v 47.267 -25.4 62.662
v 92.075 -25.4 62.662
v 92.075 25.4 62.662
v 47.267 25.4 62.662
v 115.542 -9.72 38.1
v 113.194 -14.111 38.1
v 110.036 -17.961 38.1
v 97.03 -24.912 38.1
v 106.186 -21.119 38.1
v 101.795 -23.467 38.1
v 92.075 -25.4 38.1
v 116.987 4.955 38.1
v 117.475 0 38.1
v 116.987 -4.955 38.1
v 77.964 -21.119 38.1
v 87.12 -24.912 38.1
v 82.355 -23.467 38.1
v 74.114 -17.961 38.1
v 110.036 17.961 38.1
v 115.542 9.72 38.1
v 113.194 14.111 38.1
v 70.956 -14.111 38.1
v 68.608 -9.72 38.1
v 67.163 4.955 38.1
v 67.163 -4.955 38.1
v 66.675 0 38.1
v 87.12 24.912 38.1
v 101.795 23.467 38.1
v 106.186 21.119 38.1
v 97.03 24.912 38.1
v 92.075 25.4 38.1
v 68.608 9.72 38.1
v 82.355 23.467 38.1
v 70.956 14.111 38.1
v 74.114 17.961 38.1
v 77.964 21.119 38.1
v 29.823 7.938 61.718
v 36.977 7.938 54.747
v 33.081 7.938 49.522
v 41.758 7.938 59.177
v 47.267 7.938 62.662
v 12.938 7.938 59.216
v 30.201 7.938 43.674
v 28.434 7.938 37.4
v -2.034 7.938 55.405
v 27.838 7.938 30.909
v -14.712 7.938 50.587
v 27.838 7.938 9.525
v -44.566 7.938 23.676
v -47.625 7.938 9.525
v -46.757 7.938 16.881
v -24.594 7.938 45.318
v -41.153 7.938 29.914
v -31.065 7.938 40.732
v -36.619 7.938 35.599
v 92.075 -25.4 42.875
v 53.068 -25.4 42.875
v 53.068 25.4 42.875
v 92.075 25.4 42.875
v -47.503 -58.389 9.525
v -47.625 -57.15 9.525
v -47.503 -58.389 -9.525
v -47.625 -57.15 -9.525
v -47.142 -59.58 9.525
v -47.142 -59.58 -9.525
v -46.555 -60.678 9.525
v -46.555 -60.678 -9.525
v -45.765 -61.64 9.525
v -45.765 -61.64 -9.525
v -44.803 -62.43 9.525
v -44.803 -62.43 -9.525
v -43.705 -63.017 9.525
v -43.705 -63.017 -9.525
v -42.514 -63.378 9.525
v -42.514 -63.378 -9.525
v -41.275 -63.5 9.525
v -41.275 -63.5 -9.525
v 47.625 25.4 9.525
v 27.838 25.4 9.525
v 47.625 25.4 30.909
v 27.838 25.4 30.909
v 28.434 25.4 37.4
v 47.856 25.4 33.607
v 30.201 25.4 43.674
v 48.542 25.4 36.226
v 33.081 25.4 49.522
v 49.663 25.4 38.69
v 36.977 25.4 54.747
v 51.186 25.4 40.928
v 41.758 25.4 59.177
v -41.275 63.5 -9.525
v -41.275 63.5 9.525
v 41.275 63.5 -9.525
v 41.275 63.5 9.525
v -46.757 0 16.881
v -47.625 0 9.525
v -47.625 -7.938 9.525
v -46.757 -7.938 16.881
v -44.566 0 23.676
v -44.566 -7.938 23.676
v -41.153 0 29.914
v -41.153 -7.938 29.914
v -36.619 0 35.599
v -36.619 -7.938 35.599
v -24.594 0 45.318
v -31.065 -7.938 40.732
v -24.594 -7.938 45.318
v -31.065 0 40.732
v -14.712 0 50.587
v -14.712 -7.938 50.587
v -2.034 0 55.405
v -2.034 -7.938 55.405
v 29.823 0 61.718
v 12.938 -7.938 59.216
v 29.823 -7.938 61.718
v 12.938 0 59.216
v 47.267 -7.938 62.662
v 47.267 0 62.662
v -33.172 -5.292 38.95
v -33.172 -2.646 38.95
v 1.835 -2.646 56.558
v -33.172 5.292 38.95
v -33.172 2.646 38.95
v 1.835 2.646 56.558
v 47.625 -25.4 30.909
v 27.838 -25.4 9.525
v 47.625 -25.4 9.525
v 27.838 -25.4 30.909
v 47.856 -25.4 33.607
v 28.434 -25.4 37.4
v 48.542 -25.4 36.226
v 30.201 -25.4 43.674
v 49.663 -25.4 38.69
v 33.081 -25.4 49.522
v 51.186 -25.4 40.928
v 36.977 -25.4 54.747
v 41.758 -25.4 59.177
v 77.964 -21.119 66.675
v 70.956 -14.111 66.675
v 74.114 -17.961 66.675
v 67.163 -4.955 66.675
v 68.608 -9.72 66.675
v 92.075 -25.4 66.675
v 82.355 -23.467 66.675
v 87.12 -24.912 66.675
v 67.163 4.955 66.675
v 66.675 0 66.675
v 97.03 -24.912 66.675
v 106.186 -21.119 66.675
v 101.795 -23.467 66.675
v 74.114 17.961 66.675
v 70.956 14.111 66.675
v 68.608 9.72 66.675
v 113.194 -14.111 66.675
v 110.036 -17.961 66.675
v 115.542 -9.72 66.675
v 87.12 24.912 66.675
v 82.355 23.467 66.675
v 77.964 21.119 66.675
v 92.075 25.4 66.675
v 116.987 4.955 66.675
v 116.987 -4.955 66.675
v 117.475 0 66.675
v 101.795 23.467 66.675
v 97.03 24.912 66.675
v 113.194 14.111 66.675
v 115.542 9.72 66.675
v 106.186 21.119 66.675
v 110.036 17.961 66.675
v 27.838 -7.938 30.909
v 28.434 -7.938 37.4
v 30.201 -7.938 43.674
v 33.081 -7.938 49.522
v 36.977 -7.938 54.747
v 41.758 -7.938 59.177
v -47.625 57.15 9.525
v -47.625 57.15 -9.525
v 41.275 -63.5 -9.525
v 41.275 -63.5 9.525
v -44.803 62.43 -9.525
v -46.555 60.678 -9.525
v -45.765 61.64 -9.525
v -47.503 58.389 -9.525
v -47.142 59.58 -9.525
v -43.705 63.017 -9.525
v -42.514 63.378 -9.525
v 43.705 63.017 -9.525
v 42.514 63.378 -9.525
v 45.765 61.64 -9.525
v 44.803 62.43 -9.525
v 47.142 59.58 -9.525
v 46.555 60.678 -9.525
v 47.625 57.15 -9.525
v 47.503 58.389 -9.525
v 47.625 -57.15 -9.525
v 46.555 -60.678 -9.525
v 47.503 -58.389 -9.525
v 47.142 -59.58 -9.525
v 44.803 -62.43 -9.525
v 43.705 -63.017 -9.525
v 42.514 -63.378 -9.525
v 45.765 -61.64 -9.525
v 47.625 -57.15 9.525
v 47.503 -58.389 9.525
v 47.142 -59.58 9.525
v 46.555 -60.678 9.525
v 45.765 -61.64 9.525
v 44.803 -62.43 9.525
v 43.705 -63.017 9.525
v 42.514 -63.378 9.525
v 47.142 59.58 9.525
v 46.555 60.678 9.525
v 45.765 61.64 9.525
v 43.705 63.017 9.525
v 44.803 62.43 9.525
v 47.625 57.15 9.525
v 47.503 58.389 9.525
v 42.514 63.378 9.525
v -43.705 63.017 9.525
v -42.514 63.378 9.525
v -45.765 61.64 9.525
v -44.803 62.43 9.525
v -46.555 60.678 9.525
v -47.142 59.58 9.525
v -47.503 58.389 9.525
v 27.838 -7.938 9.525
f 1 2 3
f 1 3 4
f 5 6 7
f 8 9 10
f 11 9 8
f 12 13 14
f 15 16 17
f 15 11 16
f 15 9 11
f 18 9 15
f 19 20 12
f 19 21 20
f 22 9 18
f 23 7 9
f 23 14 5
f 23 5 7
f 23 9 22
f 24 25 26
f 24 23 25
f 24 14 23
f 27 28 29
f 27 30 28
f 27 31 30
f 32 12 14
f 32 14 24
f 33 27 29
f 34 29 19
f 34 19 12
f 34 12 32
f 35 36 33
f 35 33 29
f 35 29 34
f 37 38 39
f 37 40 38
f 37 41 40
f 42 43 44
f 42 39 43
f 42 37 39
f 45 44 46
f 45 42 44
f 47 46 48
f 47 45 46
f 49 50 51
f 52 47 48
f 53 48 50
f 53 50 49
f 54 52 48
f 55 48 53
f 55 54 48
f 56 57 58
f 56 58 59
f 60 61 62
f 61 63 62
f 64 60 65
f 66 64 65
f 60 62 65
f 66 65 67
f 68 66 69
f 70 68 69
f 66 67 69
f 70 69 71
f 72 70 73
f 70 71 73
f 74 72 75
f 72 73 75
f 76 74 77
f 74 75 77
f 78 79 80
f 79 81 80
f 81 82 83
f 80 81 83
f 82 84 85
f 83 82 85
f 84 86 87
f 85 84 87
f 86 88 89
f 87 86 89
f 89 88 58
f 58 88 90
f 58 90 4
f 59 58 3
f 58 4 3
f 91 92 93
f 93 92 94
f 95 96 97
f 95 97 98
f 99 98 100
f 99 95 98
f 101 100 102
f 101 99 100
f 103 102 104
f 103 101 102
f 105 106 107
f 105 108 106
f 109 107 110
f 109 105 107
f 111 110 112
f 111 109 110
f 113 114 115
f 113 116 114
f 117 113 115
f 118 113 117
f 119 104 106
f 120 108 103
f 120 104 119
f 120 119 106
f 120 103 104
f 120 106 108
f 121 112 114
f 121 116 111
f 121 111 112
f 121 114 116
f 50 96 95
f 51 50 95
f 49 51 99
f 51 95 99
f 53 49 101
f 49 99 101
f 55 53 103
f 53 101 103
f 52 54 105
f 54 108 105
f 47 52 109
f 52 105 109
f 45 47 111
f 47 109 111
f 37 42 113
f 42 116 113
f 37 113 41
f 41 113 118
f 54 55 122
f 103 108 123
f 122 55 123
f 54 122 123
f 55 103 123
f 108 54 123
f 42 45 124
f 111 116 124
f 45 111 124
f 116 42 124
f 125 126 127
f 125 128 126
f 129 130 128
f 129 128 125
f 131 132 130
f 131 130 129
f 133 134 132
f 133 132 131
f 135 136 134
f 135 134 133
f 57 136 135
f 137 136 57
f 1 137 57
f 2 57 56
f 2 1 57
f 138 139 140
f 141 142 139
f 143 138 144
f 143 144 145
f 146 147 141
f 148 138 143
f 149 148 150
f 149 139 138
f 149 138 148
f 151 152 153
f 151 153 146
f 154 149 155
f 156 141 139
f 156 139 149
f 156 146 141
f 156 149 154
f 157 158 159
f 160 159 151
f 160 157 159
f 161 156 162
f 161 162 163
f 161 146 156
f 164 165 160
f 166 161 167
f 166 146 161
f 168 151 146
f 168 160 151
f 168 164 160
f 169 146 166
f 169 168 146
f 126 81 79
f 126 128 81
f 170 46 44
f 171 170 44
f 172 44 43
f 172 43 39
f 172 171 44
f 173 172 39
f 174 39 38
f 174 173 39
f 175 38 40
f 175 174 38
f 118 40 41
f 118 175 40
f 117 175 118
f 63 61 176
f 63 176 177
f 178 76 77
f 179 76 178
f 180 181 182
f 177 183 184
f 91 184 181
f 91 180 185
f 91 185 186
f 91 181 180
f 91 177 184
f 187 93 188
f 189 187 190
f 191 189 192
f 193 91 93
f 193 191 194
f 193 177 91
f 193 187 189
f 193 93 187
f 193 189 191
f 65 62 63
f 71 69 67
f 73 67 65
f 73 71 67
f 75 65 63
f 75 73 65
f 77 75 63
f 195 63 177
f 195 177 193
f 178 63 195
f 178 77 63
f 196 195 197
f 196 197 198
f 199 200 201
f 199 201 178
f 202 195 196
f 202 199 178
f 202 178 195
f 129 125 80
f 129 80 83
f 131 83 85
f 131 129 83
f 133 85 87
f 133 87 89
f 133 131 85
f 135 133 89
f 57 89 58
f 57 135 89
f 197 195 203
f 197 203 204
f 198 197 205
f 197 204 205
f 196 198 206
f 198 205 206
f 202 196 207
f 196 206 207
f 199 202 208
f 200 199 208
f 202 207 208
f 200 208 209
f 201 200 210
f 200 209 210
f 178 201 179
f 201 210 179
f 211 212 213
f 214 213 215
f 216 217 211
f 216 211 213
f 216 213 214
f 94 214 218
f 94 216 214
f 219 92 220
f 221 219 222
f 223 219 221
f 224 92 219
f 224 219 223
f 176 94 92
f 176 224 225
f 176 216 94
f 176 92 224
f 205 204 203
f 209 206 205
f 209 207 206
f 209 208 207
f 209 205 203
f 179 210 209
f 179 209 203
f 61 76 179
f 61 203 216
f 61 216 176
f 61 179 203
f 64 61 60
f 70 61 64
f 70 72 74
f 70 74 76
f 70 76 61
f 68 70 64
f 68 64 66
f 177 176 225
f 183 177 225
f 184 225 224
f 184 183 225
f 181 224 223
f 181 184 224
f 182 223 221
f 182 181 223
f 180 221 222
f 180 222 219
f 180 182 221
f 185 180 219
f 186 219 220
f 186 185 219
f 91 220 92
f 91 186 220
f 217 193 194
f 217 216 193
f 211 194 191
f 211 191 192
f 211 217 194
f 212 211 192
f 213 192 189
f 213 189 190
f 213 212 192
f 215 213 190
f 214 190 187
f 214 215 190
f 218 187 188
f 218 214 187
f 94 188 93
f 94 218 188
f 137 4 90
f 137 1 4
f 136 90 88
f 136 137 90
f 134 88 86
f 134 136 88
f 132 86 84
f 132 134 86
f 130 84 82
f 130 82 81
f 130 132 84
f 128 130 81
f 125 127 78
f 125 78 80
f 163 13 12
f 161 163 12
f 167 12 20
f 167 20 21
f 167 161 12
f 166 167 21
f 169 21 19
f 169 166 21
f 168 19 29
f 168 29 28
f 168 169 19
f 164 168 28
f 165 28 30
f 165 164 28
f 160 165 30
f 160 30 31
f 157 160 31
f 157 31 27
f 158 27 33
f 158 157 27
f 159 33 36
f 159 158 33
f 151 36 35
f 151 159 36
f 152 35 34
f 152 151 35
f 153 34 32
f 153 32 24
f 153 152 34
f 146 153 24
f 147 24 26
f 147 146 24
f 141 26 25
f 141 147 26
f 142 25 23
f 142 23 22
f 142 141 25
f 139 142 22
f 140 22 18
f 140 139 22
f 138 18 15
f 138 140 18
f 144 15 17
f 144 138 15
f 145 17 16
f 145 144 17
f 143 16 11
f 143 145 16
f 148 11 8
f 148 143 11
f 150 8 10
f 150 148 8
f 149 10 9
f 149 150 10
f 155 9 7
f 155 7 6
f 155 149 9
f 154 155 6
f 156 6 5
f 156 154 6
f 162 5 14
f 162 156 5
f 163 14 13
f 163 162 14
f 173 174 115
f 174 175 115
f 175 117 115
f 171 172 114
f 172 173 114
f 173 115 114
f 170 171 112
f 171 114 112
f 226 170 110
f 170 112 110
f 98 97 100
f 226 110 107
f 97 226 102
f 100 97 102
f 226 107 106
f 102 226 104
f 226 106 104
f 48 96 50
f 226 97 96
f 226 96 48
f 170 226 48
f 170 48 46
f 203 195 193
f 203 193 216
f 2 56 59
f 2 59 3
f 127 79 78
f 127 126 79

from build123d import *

# Parameters (mm, degrees)
F1_DEPTH = 63.5
F0_W     = 25.4
F0_H     = 19.7866
F2_DEPTH = 25.4
F3_DEPTH = 7.9375
F5_R     = 6.35


# Not quite as in the source:
# - a feature names something its author has since deleted; it is built from what else it names


with BuildPart() as f1:
    # F0 (on Front) → F1 (new body, symmetric)
    with BuildSketch(Plane.XZ):
        Polygon((-47.625, 9.525), (-47.625, -9.525), (47.625, -9.525), (47.625, 9.525), (27.8384, 9.525), align=None)
    extrude(amount=F1_DEPTH, both=True)

    # F5
    f5_edges = [f1.edges().sort_by_distance(p)[0] for p in [
        (47.625, -63.5, 0),
        (-47.625, -63.5, 0),
        (-47.625, 63.5, 0),
        (47.625, 63.5, 0),
    ]]
    fillet(f5_edges, radius=F5_R)


with BuildPart() as f2:
    # F0 (on Front) → F2 (new body, symmetric)
    with BuildSketch(Plane.XZ):
        with BuildLine():
            Line((27.8384, 9.525), (47.625, 9.525))
            Line((47.625, 9.525), (47.625, 30.9091658516))
            ThreePointArc((47.625, 30.9091658516), (49.0496379155, 37.4820389393), (53.0678548822, 42.8752))
            Line((53.0678548822, 42.8752), (66.675, 42.8752))
            Line((66.675, 42.8752), (66.675, 62.6618))
            Line((66.675, 62.6618), (47.2667027627, 62.6618))
            ThreePointArc((47.2667027627, 62.6618), (33.0808032049, 49.5215859226), (27.8384, 30.9091658516))
            Line((27.8384, 30.9091658516), (27.8384, 9.525))
        make_face()
        with Locations((79.375, 52.7685)):
            Rectangle(F0_W, F0_H)
    extrude(amount=F2_DEPTH, both=True)


with BuildPart() as f3:
    # F0 (on Front) → F3 (new body, symmetric)
    with BuildSketch(Plane.XZ):
        with BuildLine():
            add(Edge.make_bspline(
                [(-47.625, 9.525), (-46.8263998628, 44.964145869), (0, 62.2051432729), (47.2667027627, 62.6618)],
                knots=[0, 0, 0, 0, 108.7564010412, 108.7564010412, 108.7564010412, 108.7564010412], degree=3))
            Line((-47.625, 9.525), (27.8384, 9.525))
            Line((27.8384, 9.525), (27.8384, 30.9091658516))
            ThreePointArc((27.8384, 30.9091658516), (33.0808032049, 49.5215859226), (47.2667027627, 62.6618))
        make_face()
    extrude(amount=F3_DEPTH, both=True)


with BuildPart() as f4:
    # F0 (on Front) → F4 (revolve)
    with BuildSketch(Plane.XZ):
        Polygon((92.075, 66.675), (92.075, 62.6618), (92.075, 42.8752), (92.075, 38.1), (117.475, 38.1), (117.475, 66.675), align=None)
    revolve(axis=Axis((92.075, 0, 52.3875), (0, 0, 1)))


solid = Compound([f1.part, f2.part, f3.part, f4.part])
